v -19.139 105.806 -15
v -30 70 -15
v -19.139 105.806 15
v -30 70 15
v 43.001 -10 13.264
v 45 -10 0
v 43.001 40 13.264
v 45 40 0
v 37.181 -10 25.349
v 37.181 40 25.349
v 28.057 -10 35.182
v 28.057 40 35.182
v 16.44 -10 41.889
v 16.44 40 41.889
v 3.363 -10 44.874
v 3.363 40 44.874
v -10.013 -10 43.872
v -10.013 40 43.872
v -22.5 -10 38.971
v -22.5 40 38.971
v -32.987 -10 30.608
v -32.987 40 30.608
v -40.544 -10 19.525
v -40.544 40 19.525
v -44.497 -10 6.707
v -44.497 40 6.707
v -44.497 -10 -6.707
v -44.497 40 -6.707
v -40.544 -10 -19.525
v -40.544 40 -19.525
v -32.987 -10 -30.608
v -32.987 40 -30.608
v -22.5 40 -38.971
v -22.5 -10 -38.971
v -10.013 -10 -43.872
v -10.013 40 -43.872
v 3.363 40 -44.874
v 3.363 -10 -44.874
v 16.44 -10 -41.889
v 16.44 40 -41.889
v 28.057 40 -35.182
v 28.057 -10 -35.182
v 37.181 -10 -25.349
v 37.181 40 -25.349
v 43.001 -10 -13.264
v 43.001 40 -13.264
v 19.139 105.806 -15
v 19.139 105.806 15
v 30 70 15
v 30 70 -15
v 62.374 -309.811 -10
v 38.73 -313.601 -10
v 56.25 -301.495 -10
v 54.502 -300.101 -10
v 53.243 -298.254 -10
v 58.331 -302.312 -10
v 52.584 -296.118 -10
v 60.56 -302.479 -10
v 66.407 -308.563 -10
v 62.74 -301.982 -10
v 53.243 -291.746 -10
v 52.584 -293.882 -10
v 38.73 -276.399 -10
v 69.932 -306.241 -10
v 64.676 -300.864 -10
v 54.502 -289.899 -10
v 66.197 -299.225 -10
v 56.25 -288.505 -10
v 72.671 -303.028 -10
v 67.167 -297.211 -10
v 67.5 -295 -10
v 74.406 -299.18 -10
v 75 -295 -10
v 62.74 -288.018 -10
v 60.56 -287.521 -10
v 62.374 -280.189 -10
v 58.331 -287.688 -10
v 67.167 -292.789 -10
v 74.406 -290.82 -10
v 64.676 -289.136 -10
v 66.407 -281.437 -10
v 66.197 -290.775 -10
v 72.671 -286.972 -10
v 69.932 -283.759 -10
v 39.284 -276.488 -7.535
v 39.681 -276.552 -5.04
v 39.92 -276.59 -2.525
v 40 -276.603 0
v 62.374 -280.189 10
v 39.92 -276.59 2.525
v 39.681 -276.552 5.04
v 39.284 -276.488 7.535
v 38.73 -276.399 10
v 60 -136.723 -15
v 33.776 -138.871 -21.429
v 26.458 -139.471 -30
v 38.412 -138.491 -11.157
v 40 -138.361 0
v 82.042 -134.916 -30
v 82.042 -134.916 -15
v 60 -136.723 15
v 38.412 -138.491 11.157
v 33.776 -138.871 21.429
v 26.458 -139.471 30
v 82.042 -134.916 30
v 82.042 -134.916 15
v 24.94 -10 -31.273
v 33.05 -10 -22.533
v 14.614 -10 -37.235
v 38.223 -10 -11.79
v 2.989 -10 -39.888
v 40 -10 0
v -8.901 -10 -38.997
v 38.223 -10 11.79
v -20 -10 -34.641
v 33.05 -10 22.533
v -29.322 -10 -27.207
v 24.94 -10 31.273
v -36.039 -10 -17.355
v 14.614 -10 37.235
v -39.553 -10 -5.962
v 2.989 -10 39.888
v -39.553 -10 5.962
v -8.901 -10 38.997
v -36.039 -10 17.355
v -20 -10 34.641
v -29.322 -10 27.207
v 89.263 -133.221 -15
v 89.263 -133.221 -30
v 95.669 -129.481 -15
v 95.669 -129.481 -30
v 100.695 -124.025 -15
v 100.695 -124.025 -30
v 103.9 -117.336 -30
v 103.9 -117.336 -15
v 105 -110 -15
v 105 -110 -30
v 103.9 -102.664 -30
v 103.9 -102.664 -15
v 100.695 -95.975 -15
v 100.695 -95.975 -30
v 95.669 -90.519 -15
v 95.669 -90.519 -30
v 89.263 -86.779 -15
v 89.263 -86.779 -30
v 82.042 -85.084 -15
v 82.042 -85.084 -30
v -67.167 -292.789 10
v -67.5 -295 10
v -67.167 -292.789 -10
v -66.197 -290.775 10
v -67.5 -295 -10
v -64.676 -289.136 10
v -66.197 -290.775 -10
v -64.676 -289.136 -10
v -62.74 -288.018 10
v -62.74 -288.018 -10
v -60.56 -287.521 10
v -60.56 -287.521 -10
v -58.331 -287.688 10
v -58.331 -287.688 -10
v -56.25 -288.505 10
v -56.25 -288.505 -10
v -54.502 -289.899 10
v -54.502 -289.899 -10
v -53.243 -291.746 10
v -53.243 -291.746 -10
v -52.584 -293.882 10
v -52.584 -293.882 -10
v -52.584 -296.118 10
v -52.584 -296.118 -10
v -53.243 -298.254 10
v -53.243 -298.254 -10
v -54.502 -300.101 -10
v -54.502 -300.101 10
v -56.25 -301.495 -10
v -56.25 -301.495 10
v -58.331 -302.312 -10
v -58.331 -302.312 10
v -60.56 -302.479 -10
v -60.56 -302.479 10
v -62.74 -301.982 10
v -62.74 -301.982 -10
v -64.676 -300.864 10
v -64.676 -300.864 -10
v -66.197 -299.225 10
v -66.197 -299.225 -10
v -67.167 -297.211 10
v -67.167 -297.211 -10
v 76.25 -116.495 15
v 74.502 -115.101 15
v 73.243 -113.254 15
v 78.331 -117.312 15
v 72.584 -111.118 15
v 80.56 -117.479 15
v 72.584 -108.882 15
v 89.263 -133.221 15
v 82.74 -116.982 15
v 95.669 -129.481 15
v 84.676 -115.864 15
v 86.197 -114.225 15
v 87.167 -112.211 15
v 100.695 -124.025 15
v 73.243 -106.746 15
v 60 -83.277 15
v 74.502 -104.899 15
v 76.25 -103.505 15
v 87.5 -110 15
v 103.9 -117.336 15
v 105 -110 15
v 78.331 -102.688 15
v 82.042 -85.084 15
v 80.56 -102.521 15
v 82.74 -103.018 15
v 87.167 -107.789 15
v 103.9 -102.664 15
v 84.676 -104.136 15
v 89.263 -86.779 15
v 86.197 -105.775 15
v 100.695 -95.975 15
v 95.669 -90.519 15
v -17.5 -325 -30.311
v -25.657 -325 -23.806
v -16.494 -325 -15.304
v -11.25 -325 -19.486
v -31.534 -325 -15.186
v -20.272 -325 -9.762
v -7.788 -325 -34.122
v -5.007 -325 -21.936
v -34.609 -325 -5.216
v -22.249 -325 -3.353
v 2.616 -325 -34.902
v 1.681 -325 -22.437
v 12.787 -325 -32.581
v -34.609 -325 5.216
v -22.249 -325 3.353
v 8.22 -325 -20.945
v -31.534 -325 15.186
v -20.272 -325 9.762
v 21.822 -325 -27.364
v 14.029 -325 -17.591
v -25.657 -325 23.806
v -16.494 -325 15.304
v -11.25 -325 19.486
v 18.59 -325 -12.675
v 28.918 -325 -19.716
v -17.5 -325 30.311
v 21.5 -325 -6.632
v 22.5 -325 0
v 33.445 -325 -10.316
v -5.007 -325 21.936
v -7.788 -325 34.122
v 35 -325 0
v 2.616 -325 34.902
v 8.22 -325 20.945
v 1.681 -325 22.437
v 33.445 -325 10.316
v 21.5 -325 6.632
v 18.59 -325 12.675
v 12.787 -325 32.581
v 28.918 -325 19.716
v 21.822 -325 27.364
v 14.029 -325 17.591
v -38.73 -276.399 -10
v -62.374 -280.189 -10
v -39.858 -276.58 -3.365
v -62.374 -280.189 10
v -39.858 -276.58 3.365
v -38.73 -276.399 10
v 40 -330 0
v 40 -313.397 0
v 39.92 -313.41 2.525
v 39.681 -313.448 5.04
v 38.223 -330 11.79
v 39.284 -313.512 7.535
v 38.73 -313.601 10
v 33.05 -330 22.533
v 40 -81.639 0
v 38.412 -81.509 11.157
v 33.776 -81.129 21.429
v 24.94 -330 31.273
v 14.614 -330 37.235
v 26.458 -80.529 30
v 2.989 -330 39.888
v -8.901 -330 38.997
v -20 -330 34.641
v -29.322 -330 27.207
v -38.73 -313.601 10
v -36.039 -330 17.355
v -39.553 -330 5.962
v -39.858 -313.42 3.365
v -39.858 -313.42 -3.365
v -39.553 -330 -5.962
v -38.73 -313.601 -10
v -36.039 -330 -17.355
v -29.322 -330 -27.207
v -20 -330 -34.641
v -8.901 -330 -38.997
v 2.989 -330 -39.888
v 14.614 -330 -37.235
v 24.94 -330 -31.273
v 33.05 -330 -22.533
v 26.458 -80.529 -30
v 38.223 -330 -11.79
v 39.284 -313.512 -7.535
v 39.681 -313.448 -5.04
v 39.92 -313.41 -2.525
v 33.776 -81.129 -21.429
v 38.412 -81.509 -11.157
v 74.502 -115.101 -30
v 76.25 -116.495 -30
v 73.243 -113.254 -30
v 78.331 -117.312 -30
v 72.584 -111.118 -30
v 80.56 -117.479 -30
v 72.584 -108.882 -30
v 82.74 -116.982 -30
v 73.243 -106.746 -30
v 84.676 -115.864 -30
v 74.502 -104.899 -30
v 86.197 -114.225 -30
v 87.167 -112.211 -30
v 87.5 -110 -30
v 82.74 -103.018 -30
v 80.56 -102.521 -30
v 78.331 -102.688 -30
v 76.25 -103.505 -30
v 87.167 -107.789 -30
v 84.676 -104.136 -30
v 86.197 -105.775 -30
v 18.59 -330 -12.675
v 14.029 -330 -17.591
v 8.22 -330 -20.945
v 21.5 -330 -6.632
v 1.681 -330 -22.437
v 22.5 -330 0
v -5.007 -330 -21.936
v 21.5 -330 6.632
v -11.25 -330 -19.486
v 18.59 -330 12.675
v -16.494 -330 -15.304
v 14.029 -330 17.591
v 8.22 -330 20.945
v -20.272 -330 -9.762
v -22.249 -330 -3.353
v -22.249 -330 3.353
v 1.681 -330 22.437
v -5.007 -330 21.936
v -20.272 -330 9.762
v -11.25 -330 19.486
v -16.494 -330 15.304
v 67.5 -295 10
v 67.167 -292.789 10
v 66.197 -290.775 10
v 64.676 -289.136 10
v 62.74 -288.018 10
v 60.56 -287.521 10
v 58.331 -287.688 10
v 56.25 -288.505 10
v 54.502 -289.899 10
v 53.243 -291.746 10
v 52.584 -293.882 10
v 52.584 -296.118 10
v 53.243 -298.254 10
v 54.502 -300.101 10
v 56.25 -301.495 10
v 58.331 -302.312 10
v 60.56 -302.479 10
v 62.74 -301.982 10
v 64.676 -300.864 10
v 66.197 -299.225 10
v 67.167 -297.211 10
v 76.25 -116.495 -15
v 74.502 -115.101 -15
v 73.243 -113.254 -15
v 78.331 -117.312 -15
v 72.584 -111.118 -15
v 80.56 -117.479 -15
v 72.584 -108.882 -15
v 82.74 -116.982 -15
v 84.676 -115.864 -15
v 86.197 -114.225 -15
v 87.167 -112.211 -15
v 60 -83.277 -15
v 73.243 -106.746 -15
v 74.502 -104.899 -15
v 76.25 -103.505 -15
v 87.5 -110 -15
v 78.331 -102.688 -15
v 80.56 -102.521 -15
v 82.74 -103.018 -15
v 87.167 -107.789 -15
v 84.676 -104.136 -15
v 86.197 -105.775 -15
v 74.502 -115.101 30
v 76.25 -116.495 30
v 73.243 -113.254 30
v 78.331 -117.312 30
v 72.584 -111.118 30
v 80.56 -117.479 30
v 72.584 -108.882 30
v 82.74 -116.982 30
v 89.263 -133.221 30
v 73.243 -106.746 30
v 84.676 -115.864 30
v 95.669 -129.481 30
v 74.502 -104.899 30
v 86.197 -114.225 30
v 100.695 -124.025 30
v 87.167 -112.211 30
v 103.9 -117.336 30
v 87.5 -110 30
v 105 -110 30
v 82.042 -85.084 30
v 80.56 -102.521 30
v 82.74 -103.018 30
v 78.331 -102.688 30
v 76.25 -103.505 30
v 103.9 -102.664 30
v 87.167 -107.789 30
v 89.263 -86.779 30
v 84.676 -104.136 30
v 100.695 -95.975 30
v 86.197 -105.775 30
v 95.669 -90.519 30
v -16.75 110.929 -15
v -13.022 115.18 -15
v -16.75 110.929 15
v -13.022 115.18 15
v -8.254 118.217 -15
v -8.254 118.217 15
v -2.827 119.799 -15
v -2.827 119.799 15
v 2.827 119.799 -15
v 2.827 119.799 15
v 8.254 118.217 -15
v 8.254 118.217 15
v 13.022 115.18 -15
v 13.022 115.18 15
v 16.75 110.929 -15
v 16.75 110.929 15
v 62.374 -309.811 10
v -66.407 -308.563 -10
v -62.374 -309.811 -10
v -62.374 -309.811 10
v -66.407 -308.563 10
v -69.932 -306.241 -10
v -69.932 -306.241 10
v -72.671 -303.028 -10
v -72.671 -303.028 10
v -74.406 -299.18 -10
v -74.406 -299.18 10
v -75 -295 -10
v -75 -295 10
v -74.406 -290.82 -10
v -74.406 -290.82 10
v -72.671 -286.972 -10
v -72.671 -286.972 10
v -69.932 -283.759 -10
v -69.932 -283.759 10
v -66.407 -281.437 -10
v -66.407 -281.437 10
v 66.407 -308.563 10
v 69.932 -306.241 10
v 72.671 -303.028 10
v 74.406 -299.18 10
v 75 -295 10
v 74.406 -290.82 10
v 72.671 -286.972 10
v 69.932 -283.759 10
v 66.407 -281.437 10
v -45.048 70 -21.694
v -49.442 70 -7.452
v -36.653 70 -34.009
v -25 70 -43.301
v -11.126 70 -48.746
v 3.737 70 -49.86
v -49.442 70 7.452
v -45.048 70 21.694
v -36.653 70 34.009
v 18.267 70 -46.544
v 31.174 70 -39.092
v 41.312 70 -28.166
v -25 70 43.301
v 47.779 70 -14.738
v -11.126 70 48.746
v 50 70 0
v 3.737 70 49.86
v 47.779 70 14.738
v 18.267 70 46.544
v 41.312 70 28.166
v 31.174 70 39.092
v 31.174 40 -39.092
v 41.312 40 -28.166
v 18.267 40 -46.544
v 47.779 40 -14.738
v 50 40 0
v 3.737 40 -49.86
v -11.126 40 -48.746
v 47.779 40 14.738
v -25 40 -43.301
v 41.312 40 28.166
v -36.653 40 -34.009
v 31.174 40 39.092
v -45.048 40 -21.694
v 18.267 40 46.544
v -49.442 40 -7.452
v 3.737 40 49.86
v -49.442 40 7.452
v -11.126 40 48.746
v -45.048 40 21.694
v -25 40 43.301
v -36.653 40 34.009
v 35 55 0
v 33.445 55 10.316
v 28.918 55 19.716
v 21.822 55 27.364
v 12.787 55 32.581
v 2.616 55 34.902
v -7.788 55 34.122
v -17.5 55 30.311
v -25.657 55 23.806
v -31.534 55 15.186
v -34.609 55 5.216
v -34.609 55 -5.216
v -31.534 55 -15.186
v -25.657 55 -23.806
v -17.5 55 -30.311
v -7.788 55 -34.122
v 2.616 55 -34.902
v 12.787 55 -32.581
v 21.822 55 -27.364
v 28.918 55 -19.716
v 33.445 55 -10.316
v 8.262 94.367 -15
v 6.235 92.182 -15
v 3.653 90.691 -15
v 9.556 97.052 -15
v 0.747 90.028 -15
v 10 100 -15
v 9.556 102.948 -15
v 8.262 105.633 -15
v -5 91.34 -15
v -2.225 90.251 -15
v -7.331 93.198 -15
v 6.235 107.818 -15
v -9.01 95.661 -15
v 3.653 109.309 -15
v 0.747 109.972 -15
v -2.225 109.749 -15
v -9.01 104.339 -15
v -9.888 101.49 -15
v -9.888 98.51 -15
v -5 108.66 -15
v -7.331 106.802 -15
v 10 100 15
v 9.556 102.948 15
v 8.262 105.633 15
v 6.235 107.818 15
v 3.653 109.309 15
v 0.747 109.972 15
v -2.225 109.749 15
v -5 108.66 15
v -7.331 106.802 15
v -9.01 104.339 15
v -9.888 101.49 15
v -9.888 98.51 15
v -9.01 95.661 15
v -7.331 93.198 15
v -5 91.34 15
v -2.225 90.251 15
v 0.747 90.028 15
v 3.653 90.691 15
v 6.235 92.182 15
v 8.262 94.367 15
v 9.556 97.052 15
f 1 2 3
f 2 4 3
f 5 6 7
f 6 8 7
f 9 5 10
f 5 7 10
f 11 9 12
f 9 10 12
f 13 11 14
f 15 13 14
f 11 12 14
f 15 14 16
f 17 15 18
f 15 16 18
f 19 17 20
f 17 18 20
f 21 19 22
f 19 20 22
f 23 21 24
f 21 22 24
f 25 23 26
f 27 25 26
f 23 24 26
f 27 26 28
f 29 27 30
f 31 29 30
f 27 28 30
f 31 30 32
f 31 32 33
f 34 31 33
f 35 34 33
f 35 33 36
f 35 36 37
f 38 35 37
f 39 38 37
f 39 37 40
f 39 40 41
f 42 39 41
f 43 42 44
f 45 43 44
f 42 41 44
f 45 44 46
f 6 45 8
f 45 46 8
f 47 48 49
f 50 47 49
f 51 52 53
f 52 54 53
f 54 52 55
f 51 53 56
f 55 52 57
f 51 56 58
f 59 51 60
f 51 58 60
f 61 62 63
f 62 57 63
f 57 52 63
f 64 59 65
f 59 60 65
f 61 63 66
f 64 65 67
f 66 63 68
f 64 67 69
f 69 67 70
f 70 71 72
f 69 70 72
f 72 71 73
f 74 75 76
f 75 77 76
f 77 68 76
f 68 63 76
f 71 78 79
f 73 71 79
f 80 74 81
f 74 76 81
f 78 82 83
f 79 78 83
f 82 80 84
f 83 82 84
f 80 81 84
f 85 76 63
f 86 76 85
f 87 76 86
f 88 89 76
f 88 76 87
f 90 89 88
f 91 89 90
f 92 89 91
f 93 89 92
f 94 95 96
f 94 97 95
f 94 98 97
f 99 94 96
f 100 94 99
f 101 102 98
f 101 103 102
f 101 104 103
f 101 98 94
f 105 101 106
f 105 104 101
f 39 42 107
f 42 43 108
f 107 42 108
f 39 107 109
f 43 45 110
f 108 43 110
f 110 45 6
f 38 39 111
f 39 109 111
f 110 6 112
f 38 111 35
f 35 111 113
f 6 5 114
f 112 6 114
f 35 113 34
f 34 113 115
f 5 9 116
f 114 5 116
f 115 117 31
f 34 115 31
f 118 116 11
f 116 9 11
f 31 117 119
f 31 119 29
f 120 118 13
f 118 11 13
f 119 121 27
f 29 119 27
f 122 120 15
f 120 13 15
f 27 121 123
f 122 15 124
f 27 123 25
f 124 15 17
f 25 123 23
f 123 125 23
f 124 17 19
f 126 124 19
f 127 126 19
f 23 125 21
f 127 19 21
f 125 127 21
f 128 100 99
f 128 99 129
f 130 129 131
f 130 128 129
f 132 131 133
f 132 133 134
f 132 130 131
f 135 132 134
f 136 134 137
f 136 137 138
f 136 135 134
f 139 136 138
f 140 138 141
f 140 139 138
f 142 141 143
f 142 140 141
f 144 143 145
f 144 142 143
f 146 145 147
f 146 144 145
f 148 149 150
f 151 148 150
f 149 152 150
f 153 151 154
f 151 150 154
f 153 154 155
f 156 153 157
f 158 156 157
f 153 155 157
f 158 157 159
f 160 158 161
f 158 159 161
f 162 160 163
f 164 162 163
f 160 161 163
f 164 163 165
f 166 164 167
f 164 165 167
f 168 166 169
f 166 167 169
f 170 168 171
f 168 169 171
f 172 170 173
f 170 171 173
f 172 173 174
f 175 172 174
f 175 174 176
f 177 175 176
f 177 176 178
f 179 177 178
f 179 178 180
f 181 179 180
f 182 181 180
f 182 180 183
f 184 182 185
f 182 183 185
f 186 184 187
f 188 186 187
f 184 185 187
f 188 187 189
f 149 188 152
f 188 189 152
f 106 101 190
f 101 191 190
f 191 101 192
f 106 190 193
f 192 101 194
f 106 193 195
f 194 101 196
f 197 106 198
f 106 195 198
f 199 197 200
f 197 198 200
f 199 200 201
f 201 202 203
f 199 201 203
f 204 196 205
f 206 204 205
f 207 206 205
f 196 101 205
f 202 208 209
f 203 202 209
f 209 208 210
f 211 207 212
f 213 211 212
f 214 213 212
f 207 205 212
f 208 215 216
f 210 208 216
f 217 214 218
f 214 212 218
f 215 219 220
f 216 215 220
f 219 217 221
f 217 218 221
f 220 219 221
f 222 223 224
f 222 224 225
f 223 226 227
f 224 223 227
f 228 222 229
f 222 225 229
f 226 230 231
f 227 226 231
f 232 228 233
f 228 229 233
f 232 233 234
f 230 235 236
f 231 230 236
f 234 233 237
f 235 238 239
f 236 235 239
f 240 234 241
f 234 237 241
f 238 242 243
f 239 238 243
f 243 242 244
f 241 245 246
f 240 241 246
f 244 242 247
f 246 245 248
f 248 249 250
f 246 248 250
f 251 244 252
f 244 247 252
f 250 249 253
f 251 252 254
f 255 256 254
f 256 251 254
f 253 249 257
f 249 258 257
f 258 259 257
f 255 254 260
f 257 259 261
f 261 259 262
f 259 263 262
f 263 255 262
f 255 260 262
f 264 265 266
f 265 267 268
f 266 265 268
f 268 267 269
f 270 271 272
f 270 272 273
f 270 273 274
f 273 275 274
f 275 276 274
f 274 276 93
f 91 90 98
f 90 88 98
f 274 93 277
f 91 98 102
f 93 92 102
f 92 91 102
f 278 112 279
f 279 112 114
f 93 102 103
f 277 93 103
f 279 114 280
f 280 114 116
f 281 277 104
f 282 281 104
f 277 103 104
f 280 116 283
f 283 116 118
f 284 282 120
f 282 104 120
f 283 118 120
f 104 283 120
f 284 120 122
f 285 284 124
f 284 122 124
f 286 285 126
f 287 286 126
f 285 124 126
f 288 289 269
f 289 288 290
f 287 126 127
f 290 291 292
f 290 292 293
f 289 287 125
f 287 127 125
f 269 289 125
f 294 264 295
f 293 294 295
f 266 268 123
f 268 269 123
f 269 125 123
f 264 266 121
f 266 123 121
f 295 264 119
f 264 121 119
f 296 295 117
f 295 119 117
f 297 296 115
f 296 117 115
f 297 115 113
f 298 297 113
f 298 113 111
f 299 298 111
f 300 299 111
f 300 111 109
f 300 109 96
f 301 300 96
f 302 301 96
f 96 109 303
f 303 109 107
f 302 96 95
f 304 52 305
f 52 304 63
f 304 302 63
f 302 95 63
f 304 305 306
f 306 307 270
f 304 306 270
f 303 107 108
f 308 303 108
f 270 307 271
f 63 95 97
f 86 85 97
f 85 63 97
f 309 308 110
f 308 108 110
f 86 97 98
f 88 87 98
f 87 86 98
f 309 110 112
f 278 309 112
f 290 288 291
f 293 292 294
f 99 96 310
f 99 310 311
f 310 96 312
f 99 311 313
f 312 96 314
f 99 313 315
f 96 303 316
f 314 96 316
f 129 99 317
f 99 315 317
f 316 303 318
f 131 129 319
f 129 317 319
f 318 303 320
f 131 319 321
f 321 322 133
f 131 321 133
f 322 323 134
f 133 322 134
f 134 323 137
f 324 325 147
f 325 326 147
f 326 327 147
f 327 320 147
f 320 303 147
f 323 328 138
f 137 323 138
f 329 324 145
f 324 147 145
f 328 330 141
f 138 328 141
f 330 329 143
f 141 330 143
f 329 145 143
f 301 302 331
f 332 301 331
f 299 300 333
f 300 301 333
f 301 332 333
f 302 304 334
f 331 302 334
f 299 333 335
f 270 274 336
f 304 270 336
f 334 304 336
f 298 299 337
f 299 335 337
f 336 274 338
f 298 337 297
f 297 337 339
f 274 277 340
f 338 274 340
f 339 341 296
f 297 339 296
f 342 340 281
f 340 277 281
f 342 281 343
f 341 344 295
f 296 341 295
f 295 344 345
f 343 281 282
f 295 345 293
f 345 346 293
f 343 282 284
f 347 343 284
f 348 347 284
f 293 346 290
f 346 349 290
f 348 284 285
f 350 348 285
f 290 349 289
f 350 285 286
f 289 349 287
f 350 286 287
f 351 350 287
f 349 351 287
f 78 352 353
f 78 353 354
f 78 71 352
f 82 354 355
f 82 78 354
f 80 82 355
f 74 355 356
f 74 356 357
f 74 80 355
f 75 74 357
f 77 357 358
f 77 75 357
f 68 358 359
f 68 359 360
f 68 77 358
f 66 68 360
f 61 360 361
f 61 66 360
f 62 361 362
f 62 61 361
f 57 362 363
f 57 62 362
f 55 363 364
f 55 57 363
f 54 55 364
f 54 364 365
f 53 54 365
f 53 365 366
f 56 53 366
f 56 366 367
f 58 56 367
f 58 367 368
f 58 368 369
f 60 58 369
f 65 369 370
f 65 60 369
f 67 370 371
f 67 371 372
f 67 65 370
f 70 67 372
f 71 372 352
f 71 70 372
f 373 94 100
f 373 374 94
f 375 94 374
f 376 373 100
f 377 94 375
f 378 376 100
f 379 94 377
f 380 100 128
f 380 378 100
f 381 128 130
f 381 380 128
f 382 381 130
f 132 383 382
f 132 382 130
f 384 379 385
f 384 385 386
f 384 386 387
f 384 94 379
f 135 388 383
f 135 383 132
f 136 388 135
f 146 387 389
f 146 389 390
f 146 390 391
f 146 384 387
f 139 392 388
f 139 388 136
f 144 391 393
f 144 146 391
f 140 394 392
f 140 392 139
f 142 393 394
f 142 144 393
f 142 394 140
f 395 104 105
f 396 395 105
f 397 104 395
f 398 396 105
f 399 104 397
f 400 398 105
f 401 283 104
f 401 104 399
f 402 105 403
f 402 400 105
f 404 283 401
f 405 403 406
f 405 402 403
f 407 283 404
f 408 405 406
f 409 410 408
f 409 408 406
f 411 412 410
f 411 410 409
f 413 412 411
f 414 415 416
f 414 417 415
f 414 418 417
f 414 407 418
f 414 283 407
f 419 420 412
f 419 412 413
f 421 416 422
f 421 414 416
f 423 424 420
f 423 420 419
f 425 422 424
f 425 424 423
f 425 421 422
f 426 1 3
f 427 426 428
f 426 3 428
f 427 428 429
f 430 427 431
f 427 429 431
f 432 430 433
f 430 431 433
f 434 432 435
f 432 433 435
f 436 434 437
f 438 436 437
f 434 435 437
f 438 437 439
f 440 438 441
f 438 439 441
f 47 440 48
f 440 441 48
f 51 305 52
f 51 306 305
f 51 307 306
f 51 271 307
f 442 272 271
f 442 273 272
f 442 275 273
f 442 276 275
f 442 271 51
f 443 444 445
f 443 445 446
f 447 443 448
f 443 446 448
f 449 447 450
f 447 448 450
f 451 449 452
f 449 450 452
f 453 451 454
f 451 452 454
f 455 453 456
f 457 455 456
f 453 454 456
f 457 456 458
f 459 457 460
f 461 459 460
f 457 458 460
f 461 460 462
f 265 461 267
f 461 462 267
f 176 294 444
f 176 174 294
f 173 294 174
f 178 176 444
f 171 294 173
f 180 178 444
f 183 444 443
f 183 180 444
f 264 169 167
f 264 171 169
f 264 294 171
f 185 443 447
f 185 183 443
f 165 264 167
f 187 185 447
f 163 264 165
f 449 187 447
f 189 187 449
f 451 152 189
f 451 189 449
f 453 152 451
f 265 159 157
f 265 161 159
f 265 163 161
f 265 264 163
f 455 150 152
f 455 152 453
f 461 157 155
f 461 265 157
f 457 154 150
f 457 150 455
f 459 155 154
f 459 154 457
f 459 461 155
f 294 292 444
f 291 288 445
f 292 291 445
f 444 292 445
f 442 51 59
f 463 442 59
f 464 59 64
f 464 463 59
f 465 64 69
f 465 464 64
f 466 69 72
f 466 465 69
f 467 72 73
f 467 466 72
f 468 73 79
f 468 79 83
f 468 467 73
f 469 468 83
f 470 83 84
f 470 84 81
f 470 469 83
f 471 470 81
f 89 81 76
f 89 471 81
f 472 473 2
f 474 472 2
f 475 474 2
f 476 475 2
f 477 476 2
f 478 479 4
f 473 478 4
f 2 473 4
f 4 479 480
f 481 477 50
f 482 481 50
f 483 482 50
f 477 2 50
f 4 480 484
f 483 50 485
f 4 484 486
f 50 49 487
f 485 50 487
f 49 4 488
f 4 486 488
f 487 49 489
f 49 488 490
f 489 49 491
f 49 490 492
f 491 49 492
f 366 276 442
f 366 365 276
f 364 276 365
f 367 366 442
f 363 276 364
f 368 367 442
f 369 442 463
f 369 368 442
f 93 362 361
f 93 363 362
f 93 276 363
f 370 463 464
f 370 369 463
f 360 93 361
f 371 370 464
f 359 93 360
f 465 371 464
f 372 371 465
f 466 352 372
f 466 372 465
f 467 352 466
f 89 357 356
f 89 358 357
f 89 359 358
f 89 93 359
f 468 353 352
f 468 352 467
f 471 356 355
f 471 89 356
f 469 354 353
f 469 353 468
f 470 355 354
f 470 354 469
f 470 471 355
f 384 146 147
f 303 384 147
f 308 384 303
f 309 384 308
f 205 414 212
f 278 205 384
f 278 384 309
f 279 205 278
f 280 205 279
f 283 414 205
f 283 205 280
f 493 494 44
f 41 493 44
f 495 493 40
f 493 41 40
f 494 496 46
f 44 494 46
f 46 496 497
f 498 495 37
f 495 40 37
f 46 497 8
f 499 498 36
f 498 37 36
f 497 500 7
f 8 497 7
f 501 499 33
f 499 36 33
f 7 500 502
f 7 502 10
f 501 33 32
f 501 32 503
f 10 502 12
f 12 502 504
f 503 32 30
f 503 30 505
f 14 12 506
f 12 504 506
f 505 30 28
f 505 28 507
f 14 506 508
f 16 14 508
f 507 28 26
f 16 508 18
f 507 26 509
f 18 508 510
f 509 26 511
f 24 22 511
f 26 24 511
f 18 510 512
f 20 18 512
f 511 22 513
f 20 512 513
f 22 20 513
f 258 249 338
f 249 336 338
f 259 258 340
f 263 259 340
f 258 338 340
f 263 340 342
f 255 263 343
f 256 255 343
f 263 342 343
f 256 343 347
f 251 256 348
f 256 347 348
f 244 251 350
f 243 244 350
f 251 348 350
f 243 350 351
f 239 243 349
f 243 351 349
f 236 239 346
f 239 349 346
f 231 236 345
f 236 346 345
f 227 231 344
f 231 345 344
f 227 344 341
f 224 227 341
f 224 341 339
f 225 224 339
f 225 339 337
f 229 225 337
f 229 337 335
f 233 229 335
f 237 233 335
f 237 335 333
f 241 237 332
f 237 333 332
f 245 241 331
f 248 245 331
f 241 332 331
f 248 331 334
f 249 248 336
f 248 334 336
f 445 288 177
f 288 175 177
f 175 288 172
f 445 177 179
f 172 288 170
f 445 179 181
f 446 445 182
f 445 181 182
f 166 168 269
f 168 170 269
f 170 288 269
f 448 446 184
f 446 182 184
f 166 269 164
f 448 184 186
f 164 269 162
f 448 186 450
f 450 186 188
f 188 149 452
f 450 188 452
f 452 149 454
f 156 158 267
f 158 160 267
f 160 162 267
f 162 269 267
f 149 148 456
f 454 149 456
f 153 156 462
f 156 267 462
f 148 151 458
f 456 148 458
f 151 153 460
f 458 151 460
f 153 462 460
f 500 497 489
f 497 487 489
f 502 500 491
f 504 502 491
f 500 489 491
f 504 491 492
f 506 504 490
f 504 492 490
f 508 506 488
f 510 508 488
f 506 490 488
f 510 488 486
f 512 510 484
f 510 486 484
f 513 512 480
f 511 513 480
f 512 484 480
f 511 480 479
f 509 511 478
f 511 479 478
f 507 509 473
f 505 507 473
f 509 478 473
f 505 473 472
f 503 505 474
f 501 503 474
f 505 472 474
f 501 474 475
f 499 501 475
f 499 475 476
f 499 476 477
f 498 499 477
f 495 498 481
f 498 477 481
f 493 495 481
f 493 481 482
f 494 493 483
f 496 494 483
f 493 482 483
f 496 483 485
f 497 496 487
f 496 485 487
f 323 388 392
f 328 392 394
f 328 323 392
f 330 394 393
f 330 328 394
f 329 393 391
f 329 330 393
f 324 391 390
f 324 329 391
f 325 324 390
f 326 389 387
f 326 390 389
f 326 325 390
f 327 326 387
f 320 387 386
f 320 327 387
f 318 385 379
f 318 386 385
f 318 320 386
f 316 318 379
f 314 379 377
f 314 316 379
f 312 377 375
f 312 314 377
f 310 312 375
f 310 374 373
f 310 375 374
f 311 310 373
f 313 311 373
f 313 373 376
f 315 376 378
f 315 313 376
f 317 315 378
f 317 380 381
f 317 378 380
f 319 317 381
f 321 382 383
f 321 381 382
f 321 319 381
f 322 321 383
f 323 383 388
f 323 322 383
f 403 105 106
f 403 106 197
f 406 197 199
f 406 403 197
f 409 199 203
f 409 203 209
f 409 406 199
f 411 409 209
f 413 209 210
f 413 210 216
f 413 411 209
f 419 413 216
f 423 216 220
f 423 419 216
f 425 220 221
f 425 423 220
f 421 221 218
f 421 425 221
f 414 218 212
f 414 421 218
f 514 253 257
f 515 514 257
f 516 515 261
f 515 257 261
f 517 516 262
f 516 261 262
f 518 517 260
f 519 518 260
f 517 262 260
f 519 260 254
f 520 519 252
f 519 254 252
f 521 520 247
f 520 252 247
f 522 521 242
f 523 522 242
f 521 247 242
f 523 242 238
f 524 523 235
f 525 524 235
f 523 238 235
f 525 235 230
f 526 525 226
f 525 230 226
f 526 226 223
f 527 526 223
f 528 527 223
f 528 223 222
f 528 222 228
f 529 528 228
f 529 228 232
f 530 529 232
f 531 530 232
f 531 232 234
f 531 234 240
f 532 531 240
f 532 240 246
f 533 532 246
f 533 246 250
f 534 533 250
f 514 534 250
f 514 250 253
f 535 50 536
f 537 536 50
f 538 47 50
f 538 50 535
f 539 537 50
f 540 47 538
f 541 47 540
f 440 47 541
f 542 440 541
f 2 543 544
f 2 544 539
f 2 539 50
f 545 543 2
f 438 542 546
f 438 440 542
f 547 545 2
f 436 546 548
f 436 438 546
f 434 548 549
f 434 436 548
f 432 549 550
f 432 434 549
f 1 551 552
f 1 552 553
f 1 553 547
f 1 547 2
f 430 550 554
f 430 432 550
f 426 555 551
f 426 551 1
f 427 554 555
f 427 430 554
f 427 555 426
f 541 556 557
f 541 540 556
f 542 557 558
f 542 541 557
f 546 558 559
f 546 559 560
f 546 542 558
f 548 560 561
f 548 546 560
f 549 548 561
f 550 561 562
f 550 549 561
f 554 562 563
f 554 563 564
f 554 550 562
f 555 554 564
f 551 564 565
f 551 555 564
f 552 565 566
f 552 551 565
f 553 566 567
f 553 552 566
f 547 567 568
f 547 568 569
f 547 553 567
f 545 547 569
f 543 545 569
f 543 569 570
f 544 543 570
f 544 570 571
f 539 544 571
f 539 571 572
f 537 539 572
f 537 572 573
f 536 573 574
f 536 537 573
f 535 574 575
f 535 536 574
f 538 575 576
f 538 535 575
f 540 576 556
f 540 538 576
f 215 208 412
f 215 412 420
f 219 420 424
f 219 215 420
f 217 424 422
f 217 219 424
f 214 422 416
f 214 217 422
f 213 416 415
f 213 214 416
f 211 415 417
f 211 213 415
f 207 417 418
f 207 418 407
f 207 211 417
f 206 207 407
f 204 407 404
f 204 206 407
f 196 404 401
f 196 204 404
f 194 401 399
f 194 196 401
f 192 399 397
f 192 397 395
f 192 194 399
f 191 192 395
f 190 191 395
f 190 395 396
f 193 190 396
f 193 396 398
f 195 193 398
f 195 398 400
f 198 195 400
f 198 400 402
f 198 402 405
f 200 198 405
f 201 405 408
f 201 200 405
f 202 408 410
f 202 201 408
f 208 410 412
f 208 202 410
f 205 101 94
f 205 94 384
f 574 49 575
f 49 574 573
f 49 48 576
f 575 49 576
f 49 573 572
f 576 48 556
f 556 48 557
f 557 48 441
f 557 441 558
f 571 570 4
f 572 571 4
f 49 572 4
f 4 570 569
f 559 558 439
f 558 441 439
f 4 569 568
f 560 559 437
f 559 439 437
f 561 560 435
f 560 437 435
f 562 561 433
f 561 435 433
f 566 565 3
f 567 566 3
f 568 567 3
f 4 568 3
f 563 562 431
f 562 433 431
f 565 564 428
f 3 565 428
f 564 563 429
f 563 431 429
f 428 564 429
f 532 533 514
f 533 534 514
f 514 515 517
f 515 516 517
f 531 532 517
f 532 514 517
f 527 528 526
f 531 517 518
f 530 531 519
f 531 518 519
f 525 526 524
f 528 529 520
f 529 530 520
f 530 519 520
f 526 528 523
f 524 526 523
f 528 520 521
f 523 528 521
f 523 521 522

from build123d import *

# Parameters (mm, degrees)
SKETCH2_R           = 10
BOSS_EXTRUDE1_DEPTH = 15
SKETCH3_R           = 7.5
BOSS_EXTRUDE2_DEPTH = 10
SKETCH8_R           = 7.5
BOSS_EXTRUDE3_DEPTH = 30
SKETCH4_W           = 35
SKETCH4_H           = 315
SKETCH9_W           = 70
SKETCH9_H           = 80
CUT_EXTRUDE1_DEPTH  = 15


with BuildPart() as part:
    # Sketch1 → Base-Revolve (revolve)
    with BuildSketch(Plane.XY):
        Polygon((22.5, -330), (40, -330), (40, -10), (45, -10), (45, 40), (50, 40), (50, 70), (0, 70), (0, 55), (35, 55), (35, -325), (22.5, -325), align=None)
    revolve(axis=Axis((0, 100, 0), (0, -1, 0)))

    # Sketch2 → Boss-Extrude1 (add, symmetric)
    with BuildSketch(Plane.XY):
        with BuildLine():
            Line((19.138857956, 105.805524623), (30, 70))
            Line((30, 70), (-30, 70))
            Line((-30, 70), (-19.138857956, 105.805524623))
            ThreePointArc((-19.138857956, 105.805524623), (0, 120), (19.138857956, 105.805524623))
        make_face()
        with Locations((0, 100)):
            Circle(SKETCH2_R, mode=Mode.SUBTRACT)
    extrude(amount=BOSS_EXTRUDE1_DEPTH, both=True)

    # Sketch3 → Boss-Extrude2 (add, symmetric)
    with BuildSketch(Plane.XY):
        with BuildLine():
            Line((62.373967528, -280.189048708), (30, -275))
            Line((30, -275), (30, -315))
            Line((30, -315), (62.373967528, -309.810951292))
            ThreePointArc((62.373967528, -309.810951292), (75, -295), (62.373967528, -280.189048708))
        make_face()
        with Locations((60, -295)):
            Circle(SKETCH3_R, mode=Mode.SUBTRACT)
    boss_extrude2 = extrude(amount=BOSS_EXTRUDE2_DEPTH, both=True)

    # Mirror1: Boss-Extrude2 across plane
    add(boss_extrude2.mirror(Plane(origin=(0, 0, 0), x_dir=(0, 0, 1), z_dir=(1, 0, 0))))

    # Sketch8 → Boss-Extrude3 (add, symmetric)
    with BuildSketch(Plane.XY):
        with BuildLine():
            Line((82.041582998, -85.08350067), (20, -80))
            Line((20, -80), (20, -140))
            Line((20, -140), (82.041582998, -134.91649933))
            ThreePointArc((82.041582998, -134.91649933), (105, -110), (82.041582998, -85.08350067))
        make_face()
        with Locations((80, -110)):
            Circle(SKETCH8_R, mode=Mode.SUBTRACT)
    extrude(amount=BOSS_EXTRUDE3_DEPTH, both=True)

    # Sketch4 → Cut-Revolve1 (revolve, cut)
    with BuildSketch(Plane.XY):
        with Locations((17.5, -167.5)):
            Rectangle(SKETCH4_W, SKETCH4_H)
    revolve(axis=Axis((0, 0, 0), (0, -1, 0)), mode=Mode.SUBTRACT)

    # Sketch9 → Cut-Extrude1 (cut, symmetric)
    with BuildSketch(Plane.XY):
        with Locations((95, -110)):
            Rectangle(SKETCH9_W, SKETCH9_H)
    extrude(amount=CUT_EXTRUDE1_DEPTH, both=True, mode=Mode.SUBTRACT)


solid = part.part
